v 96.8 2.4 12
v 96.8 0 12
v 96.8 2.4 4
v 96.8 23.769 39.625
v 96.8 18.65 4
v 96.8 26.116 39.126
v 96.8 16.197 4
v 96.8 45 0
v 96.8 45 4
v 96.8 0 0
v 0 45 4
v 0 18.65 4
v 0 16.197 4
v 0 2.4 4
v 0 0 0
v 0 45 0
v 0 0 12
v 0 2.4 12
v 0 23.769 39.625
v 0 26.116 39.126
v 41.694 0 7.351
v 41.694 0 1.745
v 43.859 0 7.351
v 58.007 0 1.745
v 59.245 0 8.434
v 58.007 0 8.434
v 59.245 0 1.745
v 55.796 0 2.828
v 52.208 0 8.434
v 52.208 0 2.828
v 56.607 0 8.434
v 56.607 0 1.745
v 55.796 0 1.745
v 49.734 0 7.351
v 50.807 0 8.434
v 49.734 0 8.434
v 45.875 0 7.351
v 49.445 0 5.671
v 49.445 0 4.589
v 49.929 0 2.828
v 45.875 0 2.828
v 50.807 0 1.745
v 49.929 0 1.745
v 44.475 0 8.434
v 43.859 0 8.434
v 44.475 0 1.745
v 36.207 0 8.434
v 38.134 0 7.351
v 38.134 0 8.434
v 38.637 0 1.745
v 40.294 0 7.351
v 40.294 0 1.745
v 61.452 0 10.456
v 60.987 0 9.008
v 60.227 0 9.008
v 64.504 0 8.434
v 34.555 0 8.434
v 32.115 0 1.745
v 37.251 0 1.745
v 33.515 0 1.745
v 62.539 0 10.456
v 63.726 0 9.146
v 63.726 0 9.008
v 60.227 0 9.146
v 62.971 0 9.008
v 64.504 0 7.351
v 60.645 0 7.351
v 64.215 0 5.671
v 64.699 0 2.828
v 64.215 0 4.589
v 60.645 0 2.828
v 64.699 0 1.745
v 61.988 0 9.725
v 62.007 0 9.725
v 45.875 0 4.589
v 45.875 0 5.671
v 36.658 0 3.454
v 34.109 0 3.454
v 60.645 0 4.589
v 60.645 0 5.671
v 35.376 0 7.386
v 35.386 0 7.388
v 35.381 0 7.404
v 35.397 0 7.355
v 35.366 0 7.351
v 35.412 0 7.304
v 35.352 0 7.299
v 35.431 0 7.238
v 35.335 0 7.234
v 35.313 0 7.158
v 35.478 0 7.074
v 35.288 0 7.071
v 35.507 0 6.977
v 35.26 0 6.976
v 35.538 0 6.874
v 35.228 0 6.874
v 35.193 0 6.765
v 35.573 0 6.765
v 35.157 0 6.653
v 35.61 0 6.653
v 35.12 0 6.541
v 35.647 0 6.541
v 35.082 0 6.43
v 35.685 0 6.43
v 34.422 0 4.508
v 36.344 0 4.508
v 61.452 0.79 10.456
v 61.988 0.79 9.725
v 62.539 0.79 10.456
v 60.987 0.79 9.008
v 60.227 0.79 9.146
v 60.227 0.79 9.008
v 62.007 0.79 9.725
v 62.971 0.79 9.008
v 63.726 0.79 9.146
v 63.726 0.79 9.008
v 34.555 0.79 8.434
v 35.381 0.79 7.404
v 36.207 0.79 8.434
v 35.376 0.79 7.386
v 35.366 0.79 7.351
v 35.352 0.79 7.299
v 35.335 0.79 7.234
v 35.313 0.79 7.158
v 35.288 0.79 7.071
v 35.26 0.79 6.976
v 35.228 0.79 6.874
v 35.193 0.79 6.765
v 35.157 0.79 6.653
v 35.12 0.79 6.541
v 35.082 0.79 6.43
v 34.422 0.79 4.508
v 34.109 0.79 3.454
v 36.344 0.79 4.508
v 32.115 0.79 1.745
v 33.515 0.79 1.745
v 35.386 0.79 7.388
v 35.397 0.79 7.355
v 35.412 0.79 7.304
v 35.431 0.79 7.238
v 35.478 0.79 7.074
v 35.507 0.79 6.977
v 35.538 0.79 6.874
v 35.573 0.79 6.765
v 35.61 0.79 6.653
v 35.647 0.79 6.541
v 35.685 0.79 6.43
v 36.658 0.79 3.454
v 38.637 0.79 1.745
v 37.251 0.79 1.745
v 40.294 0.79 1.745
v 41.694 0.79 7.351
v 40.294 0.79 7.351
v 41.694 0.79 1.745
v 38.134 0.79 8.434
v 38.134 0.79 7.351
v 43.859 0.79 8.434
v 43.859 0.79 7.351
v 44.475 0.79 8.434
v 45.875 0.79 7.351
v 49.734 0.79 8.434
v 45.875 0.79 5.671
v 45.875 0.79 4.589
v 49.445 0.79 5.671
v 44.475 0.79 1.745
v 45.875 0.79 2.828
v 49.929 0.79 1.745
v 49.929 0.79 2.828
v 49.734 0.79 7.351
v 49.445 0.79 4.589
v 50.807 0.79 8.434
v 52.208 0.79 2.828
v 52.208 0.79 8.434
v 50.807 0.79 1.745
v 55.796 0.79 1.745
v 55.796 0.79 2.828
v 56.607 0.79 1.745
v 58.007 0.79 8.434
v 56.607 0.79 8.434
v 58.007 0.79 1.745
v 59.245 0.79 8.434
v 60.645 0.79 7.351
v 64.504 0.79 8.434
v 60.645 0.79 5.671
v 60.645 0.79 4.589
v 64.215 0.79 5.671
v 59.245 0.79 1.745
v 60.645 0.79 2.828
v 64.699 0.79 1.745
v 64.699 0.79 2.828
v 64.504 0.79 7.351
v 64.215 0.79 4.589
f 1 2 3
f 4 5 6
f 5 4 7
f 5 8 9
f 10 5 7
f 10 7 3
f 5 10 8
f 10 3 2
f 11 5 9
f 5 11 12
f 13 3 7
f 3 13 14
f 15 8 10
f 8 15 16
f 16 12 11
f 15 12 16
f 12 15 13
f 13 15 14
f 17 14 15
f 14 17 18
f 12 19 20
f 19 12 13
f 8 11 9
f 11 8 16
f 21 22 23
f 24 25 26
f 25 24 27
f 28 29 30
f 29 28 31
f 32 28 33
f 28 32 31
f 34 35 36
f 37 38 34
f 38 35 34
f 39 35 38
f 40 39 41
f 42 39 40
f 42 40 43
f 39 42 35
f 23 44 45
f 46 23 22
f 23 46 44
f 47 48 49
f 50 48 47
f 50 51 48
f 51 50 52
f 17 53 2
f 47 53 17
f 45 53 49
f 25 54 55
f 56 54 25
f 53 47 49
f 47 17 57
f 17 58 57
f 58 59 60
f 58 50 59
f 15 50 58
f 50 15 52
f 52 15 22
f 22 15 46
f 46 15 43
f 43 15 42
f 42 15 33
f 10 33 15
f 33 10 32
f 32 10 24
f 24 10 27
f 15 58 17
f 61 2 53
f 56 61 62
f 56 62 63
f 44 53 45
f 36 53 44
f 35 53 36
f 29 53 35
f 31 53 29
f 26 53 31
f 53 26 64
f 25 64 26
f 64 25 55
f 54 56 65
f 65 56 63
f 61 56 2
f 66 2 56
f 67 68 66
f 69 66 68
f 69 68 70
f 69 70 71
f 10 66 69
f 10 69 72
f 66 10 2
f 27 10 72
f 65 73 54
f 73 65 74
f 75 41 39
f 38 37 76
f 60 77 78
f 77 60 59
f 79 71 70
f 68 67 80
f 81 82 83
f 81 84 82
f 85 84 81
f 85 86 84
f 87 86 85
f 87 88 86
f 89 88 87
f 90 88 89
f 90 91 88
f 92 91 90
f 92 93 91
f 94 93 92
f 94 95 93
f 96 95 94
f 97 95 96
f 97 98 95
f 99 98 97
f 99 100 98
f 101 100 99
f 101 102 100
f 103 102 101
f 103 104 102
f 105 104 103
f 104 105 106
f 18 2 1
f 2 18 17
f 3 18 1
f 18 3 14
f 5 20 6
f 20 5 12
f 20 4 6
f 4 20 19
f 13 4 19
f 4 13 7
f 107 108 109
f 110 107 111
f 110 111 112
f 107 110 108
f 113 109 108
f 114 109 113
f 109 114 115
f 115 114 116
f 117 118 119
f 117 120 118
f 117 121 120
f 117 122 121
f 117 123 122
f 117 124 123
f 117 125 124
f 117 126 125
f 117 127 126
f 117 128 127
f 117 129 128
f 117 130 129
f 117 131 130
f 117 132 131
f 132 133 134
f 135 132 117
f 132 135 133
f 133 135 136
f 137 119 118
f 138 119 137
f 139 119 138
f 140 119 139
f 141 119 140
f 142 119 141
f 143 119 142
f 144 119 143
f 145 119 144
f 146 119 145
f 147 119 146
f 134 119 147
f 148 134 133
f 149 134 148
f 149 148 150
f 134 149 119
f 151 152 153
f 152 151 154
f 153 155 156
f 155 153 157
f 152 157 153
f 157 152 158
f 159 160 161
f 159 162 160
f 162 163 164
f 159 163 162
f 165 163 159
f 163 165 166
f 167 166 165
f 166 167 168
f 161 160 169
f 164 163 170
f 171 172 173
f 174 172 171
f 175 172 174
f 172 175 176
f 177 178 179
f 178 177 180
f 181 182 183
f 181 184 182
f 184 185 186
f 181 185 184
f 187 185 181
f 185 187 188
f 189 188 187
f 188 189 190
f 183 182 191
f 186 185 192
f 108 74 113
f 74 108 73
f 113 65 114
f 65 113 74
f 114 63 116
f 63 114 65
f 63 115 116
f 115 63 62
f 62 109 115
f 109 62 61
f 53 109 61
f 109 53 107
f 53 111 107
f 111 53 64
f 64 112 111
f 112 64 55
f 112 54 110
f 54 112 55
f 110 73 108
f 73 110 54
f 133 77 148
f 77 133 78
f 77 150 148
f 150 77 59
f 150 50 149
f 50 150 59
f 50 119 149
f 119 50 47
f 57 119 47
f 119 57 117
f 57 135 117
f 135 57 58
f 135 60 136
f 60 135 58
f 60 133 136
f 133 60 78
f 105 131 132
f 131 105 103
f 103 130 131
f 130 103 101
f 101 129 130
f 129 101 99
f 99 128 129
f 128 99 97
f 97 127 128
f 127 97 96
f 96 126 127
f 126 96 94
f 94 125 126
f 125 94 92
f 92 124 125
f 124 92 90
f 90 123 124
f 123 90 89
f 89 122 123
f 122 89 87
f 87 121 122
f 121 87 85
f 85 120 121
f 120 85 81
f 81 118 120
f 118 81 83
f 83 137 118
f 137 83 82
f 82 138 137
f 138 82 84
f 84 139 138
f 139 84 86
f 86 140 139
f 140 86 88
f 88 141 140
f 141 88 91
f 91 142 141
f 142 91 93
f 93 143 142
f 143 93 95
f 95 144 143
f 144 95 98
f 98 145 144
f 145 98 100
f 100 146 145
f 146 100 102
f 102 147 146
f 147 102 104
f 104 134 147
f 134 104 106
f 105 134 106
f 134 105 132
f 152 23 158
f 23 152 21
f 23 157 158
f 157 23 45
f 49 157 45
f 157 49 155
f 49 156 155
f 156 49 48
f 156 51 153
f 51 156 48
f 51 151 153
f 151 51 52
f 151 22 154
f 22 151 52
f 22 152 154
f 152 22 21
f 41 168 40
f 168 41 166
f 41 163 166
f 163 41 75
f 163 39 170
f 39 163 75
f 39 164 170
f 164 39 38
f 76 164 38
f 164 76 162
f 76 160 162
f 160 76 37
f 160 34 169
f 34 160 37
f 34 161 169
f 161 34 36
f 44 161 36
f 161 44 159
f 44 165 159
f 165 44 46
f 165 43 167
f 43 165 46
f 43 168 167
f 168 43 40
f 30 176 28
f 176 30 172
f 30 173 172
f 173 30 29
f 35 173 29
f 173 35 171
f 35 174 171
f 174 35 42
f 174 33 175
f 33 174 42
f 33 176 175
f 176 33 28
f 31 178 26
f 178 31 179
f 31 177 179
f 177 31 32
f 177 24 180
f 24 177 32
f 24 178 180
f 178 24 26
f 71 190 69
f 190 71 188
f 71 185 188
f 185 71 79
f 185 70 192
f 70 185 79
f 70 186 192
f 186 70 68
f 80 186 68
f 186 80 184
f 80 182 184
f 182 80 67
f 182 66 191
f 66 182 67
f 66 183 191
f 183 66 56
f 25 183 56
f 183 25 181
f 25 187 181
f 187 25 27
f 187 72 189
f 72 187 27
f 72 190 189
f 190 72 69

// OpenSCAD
// Porta-cartão de mesa - impressão 3D
card_w = 90;         // largura do cartão (mm)
card_h = 50;         // altura do cartão (mm)
stack = 12;          // espessura da pilha de cartões (mm)
wall = 2.4;          // espessura das paredes (mm)
clearance = 1;       // folga para os cartões (mm)
tilt = 12;           // inclinação do encosto (graus)
base_d = 45;         // profundidade da base (mm)
base_h = 4;          // altura da base (mm)
lip_h = 12;          // altura da aba da frente (mm)
back_h = 40;         // altura do encosto (mm)
word = "ATELIÊ";     // texto gravado
font_size = 7;       // altura da letra (mm)
engrave = 0.8;       // profundidade da gravação (mm)

body_w = card_w + 2 * clearance + 2 * wall;
pocket = stack + clearance;

difference() {
    union() {
        cube([body_w, base_d, base_h]);
        cube([body_w, wall, lip_h]);
        translate([0, wall + pocket + wall, 0])
            rotate([-tilt, 0, 0])
                translate([0, -wall, 0])
                    cube([body_w, wall, back_h]);
    }
    translate([body_w / 2, -0.01, lip_h / 2])
        rotate([90, 0, 0])
            translate([0, 0, -engrave])
                linear_extrude(engrave + 0.01)
                    text(word, size = font_size, font = "Liberation Sans:style=Bold",
                         halign = "center", valign = "center");
}

echo(str("Largura: ", body_w, " mm"));
echo(str("Profundidade: ", base_d, " mm"));
echo(str("Altura: ", back_h * cos(tilt), " mm"));
